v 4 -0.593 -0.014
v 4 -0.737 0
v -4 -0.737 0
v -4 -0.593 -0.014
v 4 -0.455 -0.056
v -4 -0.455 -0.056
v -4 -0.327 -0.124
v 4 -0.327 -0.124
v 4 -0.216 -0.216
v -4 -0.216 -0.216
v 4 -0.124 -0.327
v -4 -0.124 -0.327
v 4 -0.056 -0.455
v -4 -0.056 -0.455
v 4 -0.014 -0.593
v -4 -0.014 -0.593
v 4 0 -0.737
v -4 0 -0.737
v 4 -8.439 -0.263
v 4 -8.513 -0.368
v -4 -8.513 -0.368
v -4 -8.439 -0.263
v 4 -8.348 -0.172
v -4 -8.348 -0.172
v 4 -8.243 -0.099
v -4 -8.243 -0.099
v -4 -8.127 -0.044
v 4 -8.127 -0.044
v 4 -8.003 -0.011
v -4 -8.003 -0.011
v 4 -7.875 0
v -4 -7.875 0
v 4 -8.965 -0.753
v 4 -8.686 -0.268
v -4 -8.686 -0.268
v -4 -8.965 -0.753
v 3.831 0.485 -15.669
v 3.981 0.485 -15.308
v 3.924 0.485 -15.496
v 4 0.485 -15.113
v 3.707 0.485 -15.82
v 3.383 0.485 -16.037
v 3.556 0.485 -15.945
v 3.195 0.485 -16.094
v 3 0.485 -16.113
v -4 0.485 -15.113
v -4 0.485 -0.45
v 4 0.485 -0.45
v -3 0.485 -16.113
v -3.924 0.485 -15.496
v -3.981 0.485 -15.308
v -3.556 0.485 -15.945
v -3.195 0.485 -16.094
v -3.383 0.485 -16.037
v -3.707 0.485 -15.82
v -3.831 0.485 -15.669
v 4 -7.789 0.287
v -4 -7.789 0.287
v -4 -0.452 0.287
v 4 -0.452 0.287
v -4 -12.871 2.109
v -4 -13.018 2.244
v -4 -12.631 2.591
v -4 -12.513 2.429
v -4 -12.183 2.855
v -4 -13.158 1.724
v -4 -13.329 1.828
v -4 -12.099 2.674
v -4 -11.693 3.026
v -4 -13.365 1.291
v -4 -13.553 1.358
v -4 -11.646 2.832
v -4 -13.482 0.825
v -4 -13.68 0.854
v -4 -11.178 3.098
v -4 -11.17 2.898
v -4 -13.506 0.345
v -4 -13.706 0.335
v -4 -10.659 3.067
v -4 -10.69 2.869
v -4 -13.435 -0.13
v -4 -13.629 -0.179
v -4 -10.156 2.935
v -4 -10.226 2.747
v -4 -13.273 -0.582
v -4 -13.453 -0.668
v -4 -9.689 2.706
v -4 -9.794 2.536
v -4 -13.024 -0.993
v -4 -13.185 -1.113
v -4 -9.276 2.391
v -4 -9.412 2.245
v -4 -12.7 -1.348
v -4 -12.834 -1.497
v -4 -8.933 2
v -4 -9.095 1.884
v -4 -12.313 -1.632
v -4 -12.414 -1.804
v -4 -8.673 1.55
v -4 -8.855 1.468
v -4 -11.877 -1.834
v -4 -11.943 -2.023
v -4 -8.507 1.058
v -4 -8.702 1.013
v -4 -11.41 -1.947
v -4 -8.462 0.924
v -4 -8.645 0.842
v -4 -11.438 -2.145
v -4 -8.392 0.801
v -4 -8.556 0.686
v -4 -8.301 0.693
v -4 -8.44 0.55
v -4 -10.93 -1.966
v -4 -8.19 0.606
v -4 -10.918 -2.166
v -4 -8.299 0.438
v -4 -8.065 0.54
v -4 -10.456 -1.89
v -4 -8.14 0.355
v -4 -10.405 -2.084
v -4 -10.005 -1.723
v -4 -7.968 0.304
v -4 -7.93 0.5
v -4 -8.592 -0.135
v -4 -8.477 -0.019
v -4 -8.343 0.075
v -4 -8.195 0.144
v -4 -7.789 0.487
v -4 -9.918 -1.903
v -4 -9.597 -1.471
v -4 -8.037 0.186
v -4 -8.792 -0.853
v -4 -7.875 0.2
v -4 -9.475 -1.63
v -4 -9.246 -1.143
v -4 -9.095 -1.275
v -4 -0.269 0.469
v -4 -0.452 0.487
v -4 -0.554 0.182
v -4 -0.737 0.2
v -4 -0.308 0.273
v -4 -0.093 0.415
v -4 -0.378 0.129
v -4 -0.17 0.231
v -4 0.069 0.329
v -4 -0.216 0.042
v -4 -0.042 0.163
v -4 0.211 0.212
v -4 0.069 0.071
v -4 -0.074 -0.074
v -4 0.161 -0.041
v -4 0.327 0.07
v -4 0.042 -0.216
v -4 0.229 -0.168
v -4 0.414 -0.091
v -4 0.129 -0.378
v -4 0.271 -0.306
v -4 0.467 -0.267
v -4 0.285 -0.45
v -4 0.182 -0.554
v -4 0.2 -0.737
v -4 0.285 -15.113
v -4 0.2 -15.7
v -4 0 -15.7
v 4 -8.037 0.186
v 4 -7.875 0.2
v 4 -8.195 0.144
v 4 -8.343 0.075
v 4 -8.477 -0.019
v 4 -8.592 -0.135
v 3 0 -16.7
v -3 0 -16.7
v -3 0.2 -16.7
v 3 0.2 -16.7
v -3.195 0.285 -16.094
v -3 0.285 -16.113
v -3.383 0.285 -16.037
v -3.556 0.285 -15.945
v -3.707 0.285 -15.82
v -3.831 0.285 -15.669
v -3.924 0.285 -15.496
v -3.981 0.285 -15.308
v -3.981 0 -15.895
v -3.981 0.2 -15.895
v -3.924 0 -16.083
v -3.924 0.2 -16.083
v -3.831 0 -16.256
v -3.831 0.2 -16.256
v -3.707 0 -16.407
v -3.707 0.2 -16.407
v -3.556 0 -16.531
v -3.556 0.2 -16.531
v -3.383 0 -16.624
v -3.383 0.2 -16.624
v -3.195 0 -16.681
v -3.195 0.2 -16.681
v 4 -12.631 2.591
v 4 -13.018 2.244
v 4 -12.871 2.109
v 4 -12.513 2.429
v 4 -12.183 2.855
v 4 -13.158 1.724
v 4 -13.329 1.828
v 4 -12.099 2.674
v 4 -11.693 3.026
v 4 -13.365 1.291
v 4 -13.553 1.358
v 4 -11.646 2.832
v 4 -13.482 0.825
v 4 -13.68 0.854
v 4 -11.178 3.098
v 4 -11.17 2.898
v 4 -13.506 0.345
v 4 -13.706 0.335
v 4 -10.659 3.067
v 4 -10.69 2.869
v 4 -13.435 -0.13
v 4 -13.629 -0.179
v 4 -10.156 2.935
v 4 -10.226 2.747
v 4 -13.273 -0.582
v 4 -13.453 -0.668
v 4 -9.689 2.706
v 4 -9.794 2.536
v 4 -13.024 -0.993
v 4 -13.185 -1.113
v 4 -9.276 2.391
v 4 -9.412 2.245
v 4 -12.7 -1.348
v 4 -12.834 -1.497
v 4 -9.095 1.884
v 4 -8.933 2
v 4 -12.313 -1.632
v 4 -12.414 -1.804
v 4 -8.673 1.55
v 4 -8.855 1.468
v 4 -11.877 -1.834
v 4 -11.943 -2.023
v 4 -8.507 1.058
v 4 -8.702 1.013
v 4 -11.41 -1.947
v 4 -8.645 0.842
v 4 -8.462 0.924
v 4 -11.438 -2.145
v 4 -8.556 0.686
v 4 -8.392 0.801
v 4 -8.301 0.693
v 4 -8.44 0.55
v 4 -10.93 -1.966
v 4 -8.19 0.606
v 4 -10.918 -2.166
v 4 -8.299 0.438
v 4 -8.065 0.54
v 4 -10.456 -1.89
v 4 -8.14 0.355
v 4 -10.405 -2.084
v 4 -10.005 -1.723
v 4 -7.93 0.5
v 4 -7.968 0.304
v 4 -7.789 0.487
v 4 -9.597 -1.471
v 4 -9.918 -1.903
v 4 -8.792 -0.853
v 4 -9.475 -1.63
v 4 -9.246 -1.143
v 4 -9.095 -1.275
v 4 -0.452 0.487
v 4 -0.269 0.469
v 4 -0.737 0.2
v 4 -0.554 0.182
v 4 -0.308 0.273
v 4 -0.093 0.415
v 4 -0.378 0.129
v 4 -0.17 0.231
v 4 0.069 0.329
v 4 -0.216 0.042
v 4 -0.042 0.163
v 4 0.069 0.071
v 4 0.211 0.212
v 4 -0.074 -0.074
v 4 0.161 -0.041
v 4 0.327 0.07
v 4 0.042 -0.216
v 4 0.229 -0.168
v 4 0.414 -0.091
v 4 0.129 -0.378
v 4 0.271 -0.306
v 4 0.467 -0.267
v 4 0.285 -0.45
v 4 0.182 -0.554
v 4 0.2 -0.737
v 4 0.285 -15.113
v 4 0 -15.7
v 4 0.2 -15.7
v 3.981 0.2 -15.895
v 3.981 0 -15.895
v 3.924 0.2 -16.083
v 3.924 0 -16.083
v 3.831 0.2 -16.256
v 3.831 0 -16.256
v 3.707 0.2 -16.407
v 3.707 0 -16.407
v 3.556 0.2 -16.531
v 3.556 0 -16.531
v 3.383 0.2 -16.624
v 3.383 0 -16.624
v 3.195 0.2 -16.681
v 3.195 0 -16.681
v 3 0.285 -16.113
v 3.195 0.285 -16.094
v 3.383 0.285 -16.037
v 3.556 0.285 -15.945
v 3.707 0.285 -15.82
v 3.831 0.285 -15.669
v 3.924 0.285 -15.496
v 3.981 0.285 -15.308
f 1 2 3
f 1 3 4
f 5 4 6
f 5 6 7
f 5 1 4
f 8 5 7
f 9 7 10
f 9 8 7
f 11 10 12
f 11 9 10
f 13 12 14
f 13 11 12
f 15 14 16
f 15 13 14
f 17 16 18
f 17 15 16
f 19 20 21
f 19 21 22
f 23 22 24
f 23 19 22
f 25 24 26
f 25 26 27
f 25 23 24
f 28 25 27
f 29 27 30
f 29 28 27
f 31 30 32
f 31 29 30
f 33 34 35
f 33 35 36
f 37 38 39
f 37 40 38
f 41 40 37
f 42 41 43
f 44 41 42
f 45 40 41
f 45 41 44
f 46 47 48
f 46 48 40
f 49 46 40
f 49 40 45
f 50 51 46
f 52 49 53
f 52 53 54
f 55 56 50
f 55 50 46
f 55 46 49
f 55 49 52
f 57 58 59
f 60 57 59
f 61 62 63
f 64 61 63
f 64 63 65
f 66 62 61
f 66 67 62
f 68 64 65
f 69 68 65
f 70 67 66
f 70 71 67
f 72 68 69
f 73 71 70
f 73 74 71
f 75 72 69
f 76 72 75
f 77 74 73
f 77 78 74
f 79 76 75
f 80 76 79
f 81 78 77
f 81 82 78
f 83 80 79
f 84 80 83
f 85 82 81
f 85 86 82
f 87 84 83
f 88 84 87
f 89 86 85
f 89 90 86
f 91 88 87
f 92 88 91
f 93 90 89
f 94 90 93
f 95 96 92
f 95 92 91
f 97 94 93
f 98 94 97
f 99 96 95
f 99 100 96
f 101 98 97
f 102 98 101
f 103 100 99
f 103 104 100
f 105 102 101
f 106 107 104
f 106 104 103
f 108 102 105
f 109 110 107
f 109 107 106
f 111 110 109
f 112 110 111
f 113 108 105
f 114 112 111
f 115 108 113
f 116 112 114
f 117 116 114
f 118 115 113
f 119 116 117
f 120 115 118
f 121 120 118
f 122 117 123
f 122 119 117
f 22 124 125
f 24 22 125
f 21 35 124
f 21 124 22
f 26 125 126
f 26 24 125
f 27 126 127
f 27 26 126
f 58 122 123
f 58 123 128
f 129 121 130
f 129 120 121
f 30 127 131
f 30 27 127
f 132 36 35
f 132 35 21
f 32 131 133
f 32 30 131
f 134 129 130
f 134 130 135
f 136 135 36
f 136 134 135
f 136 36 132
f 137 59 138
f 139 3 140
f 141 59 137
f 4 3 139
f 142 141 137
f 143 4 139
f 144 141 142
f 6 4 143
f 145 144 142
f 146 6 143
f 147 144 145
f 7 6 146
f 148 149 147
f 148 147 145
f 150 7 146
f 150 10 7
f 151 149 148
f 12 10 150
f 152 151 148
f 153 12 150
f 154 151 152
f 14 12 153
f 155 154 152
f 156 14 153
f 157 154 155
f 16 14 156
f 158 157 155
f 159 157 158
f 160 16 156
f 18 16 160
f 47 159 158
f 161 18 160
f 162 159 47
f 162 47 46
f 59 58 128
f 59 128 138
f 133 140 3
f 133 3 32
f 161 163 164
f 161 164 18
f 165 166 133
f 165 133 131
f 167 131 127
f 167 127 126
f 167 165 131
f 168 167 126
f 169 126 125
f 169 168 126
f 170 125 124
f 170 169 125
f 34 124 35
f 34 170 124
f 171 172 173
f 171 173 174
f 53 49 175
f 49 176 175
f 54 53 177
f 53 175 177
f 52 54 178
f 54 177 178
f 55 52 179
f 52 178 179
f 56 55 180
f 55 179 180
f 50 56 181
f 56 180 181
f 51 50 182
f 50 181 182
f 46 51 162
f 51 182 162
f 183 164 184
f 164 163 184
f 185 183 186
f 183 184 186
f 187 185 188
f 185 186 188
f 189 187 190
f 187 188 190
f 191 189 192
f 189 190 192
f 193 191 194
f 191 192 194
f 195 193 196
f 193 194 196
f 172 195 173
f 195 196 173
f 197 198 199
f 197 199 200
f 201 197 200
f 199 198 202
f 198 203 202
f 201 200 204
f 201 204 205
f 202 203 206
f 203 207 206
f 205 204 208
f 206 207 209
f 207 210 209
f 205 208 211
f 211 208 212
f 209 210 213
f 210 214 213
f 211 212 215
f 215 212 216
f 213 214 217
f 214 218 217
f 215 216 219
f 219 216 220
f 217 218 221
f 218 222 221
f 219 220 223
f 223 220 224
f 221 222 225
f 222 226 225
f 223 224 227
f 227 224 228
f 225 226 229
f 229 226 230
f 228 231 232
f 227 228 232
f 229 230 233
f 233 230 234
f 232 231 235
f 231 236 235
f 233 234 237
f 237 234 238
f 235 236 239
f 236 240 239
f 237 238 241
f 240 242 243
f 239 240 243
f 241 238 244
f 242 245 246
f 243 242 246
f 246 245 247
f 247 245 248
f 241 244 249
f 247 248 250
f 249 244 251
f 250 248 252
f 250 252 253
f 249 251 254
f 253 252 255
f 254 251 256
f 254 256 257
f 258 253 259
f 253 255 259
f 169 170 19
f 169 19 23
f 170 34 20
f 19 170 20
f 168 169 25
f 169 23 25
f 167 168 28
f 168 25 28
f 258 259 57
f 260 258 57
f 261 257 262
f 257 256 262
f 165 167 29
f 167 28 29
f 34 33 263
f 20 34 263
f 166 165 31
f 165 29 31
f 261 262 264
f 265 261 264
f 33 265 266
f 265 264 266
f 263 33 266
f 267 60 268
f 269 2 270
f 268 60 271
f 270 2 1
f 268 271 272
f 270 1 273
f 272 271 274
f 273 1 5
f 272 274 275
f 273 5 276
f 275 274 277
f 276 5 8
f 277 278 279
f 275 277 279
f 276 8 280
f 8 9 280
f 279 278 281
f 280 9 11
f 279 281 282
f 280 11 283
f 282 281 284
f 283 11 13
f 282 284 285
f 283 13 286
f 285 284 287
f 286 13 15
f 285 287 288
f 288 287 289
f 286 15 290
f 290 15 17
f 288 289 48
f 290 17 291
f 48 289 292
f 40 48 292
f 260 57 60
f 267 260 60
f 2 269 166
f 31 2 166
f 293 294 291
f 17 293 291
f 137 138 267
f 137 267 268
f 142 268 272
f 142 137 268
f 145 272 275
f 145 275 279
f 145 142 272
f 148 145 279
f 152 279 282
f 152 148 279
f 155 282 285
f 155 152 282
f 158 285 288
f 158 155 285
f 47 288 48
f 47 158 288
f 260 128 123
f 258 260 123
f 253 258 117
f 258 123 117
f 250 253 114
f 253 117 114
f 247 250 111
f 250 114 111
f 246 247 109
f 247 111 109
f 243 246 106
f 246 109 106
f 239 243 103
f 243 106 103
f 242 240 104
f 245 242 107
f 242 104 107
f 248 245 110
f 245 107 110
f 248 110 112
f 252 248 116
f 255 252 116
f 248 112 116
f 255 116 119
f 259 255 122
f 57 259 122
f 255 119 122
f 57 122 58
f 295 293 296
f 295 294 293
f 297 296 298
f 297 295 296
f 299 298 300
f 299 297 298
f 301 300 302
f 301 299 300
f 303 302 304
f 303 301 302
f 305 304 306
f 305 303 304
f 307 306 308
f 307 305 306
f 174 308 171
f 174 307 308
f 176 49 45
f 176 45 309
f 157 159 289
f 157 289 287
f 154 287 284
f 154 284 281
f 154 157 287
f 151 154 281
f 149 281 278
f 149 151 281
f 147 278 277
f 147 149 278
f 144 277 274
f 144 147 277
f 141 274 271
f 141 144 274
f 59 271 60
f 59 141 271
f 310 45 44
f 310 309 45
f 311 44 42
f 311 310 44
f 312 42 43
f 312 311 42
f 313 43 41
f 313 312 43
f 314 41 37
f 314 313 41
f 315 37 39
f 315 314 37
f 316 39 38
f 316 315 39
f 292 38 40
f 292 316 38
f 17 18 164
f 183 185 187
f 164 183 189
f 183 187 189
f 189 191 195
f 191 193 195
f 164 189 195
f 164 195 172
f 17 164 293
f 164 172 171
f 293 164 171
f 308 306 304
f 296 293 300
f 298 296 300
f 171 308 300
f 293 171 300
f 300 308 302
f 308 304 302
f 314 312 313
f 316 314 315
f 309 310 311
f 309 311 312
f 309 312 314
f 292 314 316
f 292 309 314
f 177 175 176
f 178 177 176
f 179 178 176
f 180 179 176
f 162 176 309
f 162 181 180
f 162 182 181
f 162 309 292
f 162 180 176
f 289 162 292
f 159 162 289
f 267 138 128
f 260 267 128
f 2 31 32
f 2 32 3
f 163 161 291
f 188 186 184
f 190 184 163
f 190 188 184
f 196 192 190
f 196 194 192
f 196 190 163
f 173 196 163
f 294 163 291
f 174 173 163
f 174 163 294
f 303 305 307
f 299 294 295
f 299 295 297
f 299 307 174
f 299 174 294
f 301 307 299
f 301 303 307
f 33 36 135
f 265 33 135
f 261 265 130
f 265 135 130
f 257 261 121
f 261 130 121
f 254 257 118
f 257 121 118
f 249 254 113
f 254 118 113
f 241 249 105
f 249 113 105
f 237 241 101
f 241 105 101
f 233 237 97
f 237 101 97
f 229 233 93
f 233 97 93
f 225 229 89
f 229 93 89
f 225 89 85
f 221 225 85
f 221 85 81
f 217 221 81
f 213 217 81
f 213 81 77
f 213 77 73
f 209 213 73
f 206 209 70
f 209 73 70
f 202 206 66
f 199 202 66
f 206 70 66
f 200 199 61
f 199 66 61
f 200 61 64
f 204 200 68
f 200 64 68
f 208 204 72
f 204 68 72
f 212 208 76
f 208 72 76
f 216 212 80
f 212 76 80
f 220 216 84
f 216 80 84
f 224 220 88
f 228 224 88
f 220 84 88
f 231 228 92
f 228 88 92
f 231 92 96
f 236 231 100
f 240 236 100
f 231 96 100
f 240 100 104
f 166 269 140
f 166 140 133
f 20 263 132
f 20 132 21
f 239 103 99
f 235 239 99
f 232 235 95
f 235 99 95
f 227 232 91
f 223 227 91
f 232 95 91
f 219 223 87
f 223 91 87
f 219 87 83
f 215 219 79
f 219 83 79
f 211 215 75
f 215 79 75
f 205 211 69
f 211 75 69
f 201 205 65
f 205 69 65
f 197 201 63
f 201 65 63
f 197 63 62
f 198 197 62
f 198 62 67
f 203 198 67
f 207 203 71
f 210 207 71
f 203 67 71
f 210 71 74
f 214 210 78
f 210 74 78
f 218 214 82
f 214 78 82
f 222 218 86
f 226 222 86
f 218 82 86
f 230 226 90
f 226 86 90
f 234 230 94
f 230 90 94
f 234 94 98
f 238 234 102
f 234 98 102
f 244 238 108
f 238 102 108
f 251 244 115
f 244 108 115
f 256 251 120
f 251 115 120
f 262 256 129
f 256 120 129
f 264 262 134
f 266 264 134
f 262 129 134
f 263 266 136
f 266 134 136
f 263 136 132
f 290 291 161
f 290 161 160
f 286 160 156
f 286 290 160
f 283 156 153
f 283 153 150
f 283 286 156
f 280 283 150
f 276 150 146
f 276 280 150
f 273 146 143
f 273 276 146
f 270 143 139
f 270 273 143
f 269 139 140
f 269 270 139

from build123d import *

# Parameters (mm, degrees)
SKETCH1_W                    = 8
SKETCH1_H                    = 16.7
BASE_FLANGE1_DEPTH           = 0.2
EDGE_FLANGE2_STRIP_W         = 2.2732
EDGE_FLANGE2_STRIP_H         = 0.2
EDGE_FLANGE2_STRIP_CUT_DEPTH = 8
EDGE_FLANGE2_DEPTH           = 8
EDGE_FLANGE3_STRIP_CUT_DEPTH = 8
EDGE_FLANGE3_DEPTH           = 8
HEM1_START                   = -4
HEM1_DEPTH                   = 8
EDGE_FLANGE4_START           = -4
EDGE_FLANGE4_DEPTH           = 8
EDGE_FLANGE5_STRIP_W         = 2.2732
EDGE_FLANGE5_STRIP_H         = 0.2
EDGE_FLANGE5_STRIP_CUT_DEPTH = 8
EDGE_FLANGE5_DEPTH           = 8
FILLET1_R                    = 1


# Read off the part's stored shape, not the designer's step: Hem1, Edge-Flange4
# Sheet-metal steps are written as plain solids
with BuildPart() as part:
    # Sketch1 → Base-Flange1 (new body)
    with BuildSketch(Plane(origin=(0, 0, 0), x_dir=(1, 0, 0), z_dir=(0, 1, 0))):
        with Locations((0, 8.35)):
            Rectangle(SKETCH1_W, SKETCH1_H)
    extrude(amount=BASE_FLANGE1_DEPTH)

    # Edge-Flange2 strip (across the edge) → Edge-Flange2 strip cut (cut)
    with BuildSketch(Plane(origin=(4, 0, 0), x_dir=(0, 0, -1), z_dir=(-1, 0, 0))):
        with Locations((-0.4, -0.1)):
            Rectangle(EDGE_FLANGE2_STRIP_W, EDGE_FLANGE2_STRIP_H)
    extrude(amount=EDGE_FLANGE2_STRIP_CUT_DEPTH, mode=Mode.SUBTRACT)

    # Edge-Flange2 section (across the edge) → Edge-Flange2 (add)
    with BuildSketch(Plane(origin=(4, 0, 0), x_dir=(0, 0, -1), z_dir=(-1, 0, 0))):
        with BuildLine():
            Line((-0.2, 0.7366), (-0.2, 8.3))
            Line((-0.2, 8.3), (0, 8.3))
            Line((0, 8.3), (0, 0.7366))
            ThreePointArc((0, 0.7366), (0.215745145, 0.215745145), (0.7366, 0))
            Line((0.7366, 0), (0.7366, -0.2))
            ThreePointArc((0.7366, -0.2), (0.074323789, 0.074323789), (-0.2, 0.7366))
        make_face()
    extrude(amount=EDGE_FLANGE2_DEPTH)

    # Edge-Flange3 strip (across the edge) → Edge-Flange3 strip cut (cut)
    with BuildSketch(Plane(origin=(4, -8.3, 0), x_dir=(0, 0.8660254037844346, -0.5000000000000071), z_dir=(-1, 0, 0))):
        Polygon((-1.700348948, 0.750756815), (0.2683, -0.385843185), (0.3683, -0.212638104), (-1.600348948, 0.923961896), align=None)
    extrude(amount=EDGE_FLANGE3_STRIP_CUT_DEPTH, mode=Mode.SUBTRACT)

    # Edge-Flange3 section (across the edge) → Edge-Flange3 (add)
    with BuildSketch(Plane(origin=(4, -8.3, 0), x_dir=(0, 0.8660254037844346, -0.5000000000000071), z_dir=(-1, 0, 0))):
        with BuildLine():
            Line((-0.2, 0.425276208), (-0.2, 0.984529946))
            Line((-0.2, 0.984529946), (0, 0.984529946))
            Line((0, 0.984529946), (0, 0.425276208))
            ThreePointArc((0, 0.425276208), (0.098685688, 0.056976208), (0.3683, -0.212638104))
            Line((0.3683, -0.212638104), (0.2683, -0.385843185))
            ThreePointArc((0.2683, -0.385843185), (-0.074519393, -0.043023792), (-0.2, 0.425276208))
        make_face()
    extrude(amount=EDGE_FLANGE3_DEPTH)

    # Hem1 outline → Hem1 (add)
    with BuildSketch(Plane.YZ.offset(HEM1_START)):
        with BuildLine():
            Line((-8.701650804, 1.012627873), (-8.506776791, 1.057618084))
            ThreePointArc((-8.506776791, 1.057618084), (-13.680298712, 0.854349855), (-8.792264973, -0.852627944))
            Line((-8.792264973, -0.852627944), (-8.965470054, -0.752627944))
            ThreePointArc((-8.965470054, -0.752627944), (-13.482495539, 0.824787973), (-8.701650804, 1.012627873))
        make_face()
    extrude(amount=HEM1_DEPTH)

    # Edge-Flange4 outline → Edge-Flange4 (add)
    with BuildSketch(Plane.YZ.offset(EDGE_FLANGE4_START)):
        with BuildLine():
            ThreePointArc((-8.701650804, 1.012627873), (-8.37210301, 0.490326231), (-7.789055802, 0.286717031))
            Line((-7.789055802, 0.286717031), (0.285026102, 0.286717031))
            Line((0.285026102, 0.286717031), (0.285026102, 0.486717031))
            Line((0.285026102, 0.486717031), (-7.789055802, 0.486717031))
            ThreePointArc((-7.789055802, 0.486717031), (-8.247600083, 0.646847862), (-8.506776791, 1.057618084))
            Line((-8.506776791, 1.057618084), (-8.701650804, 1.012627873))
        make_face()
    extrude(amount=EDGE_FLANGE4_DEPTH)

    # Edge-Flange5 strip (across the edge) → Edge-Flange5 strip cut (cut)
    with BuildSketch(Plane(origin=(-4, 0.285026102, 0.286717031), x_dir=(0, -1, 0), z_dir=(1, 0, 0))):
        with Locations((-0.4, -0.1)):
            Rectangle(EDGE_FLANGE5_STRIP_W, EDGE_FLANGE5_STRIP_H)
    extrude(amount=EDGE_FLANGE5_STRIP_CUT_DEPTH, mode=Mode.SUBTRACT)

    # Edge-Flange5 section (across the edge) → Edge-Flange5 (add)
    with BuildSketch(Plane(origin=(-4, 0.285026102, 0.286717031), x_dir=(0, -1, 0), z_dir=(1, 0, 0))):
        with BuildLine():
            Line((-0.2, 0.7366), (-0.2, 16.4))
            Line((-0.2, 16.4), (0, 16.4))
            Line((0, 16.4), (0, 0.7366))
            ThreePointArc((0, 0.7366), (0.215745145, 0.215745145), (0.7366, 0))
            Line((0.7366, 0), (0.7366, -0.2))
            ThreePointArc((0.7366, -0.2), (0.074323789, 0.074323789), (-0.2, 0.7366))
        make_face()
    extrude(amount=EDGE_FLANGE5_DEPTH)

    # Fillet1
    fillet1_edges = [part.edges().sort_by_distance(p)[0] for p in [
        (-4, 0.385026102, -16.113282969),
        (4, 0.385026102, -16.113282969),
        (-4, 0.1, -16.7),
        (4, 0.1, -16.7),
    ]]
    fillet(fillet1_edges, radius=FILLET1_R)


solid = part.part
